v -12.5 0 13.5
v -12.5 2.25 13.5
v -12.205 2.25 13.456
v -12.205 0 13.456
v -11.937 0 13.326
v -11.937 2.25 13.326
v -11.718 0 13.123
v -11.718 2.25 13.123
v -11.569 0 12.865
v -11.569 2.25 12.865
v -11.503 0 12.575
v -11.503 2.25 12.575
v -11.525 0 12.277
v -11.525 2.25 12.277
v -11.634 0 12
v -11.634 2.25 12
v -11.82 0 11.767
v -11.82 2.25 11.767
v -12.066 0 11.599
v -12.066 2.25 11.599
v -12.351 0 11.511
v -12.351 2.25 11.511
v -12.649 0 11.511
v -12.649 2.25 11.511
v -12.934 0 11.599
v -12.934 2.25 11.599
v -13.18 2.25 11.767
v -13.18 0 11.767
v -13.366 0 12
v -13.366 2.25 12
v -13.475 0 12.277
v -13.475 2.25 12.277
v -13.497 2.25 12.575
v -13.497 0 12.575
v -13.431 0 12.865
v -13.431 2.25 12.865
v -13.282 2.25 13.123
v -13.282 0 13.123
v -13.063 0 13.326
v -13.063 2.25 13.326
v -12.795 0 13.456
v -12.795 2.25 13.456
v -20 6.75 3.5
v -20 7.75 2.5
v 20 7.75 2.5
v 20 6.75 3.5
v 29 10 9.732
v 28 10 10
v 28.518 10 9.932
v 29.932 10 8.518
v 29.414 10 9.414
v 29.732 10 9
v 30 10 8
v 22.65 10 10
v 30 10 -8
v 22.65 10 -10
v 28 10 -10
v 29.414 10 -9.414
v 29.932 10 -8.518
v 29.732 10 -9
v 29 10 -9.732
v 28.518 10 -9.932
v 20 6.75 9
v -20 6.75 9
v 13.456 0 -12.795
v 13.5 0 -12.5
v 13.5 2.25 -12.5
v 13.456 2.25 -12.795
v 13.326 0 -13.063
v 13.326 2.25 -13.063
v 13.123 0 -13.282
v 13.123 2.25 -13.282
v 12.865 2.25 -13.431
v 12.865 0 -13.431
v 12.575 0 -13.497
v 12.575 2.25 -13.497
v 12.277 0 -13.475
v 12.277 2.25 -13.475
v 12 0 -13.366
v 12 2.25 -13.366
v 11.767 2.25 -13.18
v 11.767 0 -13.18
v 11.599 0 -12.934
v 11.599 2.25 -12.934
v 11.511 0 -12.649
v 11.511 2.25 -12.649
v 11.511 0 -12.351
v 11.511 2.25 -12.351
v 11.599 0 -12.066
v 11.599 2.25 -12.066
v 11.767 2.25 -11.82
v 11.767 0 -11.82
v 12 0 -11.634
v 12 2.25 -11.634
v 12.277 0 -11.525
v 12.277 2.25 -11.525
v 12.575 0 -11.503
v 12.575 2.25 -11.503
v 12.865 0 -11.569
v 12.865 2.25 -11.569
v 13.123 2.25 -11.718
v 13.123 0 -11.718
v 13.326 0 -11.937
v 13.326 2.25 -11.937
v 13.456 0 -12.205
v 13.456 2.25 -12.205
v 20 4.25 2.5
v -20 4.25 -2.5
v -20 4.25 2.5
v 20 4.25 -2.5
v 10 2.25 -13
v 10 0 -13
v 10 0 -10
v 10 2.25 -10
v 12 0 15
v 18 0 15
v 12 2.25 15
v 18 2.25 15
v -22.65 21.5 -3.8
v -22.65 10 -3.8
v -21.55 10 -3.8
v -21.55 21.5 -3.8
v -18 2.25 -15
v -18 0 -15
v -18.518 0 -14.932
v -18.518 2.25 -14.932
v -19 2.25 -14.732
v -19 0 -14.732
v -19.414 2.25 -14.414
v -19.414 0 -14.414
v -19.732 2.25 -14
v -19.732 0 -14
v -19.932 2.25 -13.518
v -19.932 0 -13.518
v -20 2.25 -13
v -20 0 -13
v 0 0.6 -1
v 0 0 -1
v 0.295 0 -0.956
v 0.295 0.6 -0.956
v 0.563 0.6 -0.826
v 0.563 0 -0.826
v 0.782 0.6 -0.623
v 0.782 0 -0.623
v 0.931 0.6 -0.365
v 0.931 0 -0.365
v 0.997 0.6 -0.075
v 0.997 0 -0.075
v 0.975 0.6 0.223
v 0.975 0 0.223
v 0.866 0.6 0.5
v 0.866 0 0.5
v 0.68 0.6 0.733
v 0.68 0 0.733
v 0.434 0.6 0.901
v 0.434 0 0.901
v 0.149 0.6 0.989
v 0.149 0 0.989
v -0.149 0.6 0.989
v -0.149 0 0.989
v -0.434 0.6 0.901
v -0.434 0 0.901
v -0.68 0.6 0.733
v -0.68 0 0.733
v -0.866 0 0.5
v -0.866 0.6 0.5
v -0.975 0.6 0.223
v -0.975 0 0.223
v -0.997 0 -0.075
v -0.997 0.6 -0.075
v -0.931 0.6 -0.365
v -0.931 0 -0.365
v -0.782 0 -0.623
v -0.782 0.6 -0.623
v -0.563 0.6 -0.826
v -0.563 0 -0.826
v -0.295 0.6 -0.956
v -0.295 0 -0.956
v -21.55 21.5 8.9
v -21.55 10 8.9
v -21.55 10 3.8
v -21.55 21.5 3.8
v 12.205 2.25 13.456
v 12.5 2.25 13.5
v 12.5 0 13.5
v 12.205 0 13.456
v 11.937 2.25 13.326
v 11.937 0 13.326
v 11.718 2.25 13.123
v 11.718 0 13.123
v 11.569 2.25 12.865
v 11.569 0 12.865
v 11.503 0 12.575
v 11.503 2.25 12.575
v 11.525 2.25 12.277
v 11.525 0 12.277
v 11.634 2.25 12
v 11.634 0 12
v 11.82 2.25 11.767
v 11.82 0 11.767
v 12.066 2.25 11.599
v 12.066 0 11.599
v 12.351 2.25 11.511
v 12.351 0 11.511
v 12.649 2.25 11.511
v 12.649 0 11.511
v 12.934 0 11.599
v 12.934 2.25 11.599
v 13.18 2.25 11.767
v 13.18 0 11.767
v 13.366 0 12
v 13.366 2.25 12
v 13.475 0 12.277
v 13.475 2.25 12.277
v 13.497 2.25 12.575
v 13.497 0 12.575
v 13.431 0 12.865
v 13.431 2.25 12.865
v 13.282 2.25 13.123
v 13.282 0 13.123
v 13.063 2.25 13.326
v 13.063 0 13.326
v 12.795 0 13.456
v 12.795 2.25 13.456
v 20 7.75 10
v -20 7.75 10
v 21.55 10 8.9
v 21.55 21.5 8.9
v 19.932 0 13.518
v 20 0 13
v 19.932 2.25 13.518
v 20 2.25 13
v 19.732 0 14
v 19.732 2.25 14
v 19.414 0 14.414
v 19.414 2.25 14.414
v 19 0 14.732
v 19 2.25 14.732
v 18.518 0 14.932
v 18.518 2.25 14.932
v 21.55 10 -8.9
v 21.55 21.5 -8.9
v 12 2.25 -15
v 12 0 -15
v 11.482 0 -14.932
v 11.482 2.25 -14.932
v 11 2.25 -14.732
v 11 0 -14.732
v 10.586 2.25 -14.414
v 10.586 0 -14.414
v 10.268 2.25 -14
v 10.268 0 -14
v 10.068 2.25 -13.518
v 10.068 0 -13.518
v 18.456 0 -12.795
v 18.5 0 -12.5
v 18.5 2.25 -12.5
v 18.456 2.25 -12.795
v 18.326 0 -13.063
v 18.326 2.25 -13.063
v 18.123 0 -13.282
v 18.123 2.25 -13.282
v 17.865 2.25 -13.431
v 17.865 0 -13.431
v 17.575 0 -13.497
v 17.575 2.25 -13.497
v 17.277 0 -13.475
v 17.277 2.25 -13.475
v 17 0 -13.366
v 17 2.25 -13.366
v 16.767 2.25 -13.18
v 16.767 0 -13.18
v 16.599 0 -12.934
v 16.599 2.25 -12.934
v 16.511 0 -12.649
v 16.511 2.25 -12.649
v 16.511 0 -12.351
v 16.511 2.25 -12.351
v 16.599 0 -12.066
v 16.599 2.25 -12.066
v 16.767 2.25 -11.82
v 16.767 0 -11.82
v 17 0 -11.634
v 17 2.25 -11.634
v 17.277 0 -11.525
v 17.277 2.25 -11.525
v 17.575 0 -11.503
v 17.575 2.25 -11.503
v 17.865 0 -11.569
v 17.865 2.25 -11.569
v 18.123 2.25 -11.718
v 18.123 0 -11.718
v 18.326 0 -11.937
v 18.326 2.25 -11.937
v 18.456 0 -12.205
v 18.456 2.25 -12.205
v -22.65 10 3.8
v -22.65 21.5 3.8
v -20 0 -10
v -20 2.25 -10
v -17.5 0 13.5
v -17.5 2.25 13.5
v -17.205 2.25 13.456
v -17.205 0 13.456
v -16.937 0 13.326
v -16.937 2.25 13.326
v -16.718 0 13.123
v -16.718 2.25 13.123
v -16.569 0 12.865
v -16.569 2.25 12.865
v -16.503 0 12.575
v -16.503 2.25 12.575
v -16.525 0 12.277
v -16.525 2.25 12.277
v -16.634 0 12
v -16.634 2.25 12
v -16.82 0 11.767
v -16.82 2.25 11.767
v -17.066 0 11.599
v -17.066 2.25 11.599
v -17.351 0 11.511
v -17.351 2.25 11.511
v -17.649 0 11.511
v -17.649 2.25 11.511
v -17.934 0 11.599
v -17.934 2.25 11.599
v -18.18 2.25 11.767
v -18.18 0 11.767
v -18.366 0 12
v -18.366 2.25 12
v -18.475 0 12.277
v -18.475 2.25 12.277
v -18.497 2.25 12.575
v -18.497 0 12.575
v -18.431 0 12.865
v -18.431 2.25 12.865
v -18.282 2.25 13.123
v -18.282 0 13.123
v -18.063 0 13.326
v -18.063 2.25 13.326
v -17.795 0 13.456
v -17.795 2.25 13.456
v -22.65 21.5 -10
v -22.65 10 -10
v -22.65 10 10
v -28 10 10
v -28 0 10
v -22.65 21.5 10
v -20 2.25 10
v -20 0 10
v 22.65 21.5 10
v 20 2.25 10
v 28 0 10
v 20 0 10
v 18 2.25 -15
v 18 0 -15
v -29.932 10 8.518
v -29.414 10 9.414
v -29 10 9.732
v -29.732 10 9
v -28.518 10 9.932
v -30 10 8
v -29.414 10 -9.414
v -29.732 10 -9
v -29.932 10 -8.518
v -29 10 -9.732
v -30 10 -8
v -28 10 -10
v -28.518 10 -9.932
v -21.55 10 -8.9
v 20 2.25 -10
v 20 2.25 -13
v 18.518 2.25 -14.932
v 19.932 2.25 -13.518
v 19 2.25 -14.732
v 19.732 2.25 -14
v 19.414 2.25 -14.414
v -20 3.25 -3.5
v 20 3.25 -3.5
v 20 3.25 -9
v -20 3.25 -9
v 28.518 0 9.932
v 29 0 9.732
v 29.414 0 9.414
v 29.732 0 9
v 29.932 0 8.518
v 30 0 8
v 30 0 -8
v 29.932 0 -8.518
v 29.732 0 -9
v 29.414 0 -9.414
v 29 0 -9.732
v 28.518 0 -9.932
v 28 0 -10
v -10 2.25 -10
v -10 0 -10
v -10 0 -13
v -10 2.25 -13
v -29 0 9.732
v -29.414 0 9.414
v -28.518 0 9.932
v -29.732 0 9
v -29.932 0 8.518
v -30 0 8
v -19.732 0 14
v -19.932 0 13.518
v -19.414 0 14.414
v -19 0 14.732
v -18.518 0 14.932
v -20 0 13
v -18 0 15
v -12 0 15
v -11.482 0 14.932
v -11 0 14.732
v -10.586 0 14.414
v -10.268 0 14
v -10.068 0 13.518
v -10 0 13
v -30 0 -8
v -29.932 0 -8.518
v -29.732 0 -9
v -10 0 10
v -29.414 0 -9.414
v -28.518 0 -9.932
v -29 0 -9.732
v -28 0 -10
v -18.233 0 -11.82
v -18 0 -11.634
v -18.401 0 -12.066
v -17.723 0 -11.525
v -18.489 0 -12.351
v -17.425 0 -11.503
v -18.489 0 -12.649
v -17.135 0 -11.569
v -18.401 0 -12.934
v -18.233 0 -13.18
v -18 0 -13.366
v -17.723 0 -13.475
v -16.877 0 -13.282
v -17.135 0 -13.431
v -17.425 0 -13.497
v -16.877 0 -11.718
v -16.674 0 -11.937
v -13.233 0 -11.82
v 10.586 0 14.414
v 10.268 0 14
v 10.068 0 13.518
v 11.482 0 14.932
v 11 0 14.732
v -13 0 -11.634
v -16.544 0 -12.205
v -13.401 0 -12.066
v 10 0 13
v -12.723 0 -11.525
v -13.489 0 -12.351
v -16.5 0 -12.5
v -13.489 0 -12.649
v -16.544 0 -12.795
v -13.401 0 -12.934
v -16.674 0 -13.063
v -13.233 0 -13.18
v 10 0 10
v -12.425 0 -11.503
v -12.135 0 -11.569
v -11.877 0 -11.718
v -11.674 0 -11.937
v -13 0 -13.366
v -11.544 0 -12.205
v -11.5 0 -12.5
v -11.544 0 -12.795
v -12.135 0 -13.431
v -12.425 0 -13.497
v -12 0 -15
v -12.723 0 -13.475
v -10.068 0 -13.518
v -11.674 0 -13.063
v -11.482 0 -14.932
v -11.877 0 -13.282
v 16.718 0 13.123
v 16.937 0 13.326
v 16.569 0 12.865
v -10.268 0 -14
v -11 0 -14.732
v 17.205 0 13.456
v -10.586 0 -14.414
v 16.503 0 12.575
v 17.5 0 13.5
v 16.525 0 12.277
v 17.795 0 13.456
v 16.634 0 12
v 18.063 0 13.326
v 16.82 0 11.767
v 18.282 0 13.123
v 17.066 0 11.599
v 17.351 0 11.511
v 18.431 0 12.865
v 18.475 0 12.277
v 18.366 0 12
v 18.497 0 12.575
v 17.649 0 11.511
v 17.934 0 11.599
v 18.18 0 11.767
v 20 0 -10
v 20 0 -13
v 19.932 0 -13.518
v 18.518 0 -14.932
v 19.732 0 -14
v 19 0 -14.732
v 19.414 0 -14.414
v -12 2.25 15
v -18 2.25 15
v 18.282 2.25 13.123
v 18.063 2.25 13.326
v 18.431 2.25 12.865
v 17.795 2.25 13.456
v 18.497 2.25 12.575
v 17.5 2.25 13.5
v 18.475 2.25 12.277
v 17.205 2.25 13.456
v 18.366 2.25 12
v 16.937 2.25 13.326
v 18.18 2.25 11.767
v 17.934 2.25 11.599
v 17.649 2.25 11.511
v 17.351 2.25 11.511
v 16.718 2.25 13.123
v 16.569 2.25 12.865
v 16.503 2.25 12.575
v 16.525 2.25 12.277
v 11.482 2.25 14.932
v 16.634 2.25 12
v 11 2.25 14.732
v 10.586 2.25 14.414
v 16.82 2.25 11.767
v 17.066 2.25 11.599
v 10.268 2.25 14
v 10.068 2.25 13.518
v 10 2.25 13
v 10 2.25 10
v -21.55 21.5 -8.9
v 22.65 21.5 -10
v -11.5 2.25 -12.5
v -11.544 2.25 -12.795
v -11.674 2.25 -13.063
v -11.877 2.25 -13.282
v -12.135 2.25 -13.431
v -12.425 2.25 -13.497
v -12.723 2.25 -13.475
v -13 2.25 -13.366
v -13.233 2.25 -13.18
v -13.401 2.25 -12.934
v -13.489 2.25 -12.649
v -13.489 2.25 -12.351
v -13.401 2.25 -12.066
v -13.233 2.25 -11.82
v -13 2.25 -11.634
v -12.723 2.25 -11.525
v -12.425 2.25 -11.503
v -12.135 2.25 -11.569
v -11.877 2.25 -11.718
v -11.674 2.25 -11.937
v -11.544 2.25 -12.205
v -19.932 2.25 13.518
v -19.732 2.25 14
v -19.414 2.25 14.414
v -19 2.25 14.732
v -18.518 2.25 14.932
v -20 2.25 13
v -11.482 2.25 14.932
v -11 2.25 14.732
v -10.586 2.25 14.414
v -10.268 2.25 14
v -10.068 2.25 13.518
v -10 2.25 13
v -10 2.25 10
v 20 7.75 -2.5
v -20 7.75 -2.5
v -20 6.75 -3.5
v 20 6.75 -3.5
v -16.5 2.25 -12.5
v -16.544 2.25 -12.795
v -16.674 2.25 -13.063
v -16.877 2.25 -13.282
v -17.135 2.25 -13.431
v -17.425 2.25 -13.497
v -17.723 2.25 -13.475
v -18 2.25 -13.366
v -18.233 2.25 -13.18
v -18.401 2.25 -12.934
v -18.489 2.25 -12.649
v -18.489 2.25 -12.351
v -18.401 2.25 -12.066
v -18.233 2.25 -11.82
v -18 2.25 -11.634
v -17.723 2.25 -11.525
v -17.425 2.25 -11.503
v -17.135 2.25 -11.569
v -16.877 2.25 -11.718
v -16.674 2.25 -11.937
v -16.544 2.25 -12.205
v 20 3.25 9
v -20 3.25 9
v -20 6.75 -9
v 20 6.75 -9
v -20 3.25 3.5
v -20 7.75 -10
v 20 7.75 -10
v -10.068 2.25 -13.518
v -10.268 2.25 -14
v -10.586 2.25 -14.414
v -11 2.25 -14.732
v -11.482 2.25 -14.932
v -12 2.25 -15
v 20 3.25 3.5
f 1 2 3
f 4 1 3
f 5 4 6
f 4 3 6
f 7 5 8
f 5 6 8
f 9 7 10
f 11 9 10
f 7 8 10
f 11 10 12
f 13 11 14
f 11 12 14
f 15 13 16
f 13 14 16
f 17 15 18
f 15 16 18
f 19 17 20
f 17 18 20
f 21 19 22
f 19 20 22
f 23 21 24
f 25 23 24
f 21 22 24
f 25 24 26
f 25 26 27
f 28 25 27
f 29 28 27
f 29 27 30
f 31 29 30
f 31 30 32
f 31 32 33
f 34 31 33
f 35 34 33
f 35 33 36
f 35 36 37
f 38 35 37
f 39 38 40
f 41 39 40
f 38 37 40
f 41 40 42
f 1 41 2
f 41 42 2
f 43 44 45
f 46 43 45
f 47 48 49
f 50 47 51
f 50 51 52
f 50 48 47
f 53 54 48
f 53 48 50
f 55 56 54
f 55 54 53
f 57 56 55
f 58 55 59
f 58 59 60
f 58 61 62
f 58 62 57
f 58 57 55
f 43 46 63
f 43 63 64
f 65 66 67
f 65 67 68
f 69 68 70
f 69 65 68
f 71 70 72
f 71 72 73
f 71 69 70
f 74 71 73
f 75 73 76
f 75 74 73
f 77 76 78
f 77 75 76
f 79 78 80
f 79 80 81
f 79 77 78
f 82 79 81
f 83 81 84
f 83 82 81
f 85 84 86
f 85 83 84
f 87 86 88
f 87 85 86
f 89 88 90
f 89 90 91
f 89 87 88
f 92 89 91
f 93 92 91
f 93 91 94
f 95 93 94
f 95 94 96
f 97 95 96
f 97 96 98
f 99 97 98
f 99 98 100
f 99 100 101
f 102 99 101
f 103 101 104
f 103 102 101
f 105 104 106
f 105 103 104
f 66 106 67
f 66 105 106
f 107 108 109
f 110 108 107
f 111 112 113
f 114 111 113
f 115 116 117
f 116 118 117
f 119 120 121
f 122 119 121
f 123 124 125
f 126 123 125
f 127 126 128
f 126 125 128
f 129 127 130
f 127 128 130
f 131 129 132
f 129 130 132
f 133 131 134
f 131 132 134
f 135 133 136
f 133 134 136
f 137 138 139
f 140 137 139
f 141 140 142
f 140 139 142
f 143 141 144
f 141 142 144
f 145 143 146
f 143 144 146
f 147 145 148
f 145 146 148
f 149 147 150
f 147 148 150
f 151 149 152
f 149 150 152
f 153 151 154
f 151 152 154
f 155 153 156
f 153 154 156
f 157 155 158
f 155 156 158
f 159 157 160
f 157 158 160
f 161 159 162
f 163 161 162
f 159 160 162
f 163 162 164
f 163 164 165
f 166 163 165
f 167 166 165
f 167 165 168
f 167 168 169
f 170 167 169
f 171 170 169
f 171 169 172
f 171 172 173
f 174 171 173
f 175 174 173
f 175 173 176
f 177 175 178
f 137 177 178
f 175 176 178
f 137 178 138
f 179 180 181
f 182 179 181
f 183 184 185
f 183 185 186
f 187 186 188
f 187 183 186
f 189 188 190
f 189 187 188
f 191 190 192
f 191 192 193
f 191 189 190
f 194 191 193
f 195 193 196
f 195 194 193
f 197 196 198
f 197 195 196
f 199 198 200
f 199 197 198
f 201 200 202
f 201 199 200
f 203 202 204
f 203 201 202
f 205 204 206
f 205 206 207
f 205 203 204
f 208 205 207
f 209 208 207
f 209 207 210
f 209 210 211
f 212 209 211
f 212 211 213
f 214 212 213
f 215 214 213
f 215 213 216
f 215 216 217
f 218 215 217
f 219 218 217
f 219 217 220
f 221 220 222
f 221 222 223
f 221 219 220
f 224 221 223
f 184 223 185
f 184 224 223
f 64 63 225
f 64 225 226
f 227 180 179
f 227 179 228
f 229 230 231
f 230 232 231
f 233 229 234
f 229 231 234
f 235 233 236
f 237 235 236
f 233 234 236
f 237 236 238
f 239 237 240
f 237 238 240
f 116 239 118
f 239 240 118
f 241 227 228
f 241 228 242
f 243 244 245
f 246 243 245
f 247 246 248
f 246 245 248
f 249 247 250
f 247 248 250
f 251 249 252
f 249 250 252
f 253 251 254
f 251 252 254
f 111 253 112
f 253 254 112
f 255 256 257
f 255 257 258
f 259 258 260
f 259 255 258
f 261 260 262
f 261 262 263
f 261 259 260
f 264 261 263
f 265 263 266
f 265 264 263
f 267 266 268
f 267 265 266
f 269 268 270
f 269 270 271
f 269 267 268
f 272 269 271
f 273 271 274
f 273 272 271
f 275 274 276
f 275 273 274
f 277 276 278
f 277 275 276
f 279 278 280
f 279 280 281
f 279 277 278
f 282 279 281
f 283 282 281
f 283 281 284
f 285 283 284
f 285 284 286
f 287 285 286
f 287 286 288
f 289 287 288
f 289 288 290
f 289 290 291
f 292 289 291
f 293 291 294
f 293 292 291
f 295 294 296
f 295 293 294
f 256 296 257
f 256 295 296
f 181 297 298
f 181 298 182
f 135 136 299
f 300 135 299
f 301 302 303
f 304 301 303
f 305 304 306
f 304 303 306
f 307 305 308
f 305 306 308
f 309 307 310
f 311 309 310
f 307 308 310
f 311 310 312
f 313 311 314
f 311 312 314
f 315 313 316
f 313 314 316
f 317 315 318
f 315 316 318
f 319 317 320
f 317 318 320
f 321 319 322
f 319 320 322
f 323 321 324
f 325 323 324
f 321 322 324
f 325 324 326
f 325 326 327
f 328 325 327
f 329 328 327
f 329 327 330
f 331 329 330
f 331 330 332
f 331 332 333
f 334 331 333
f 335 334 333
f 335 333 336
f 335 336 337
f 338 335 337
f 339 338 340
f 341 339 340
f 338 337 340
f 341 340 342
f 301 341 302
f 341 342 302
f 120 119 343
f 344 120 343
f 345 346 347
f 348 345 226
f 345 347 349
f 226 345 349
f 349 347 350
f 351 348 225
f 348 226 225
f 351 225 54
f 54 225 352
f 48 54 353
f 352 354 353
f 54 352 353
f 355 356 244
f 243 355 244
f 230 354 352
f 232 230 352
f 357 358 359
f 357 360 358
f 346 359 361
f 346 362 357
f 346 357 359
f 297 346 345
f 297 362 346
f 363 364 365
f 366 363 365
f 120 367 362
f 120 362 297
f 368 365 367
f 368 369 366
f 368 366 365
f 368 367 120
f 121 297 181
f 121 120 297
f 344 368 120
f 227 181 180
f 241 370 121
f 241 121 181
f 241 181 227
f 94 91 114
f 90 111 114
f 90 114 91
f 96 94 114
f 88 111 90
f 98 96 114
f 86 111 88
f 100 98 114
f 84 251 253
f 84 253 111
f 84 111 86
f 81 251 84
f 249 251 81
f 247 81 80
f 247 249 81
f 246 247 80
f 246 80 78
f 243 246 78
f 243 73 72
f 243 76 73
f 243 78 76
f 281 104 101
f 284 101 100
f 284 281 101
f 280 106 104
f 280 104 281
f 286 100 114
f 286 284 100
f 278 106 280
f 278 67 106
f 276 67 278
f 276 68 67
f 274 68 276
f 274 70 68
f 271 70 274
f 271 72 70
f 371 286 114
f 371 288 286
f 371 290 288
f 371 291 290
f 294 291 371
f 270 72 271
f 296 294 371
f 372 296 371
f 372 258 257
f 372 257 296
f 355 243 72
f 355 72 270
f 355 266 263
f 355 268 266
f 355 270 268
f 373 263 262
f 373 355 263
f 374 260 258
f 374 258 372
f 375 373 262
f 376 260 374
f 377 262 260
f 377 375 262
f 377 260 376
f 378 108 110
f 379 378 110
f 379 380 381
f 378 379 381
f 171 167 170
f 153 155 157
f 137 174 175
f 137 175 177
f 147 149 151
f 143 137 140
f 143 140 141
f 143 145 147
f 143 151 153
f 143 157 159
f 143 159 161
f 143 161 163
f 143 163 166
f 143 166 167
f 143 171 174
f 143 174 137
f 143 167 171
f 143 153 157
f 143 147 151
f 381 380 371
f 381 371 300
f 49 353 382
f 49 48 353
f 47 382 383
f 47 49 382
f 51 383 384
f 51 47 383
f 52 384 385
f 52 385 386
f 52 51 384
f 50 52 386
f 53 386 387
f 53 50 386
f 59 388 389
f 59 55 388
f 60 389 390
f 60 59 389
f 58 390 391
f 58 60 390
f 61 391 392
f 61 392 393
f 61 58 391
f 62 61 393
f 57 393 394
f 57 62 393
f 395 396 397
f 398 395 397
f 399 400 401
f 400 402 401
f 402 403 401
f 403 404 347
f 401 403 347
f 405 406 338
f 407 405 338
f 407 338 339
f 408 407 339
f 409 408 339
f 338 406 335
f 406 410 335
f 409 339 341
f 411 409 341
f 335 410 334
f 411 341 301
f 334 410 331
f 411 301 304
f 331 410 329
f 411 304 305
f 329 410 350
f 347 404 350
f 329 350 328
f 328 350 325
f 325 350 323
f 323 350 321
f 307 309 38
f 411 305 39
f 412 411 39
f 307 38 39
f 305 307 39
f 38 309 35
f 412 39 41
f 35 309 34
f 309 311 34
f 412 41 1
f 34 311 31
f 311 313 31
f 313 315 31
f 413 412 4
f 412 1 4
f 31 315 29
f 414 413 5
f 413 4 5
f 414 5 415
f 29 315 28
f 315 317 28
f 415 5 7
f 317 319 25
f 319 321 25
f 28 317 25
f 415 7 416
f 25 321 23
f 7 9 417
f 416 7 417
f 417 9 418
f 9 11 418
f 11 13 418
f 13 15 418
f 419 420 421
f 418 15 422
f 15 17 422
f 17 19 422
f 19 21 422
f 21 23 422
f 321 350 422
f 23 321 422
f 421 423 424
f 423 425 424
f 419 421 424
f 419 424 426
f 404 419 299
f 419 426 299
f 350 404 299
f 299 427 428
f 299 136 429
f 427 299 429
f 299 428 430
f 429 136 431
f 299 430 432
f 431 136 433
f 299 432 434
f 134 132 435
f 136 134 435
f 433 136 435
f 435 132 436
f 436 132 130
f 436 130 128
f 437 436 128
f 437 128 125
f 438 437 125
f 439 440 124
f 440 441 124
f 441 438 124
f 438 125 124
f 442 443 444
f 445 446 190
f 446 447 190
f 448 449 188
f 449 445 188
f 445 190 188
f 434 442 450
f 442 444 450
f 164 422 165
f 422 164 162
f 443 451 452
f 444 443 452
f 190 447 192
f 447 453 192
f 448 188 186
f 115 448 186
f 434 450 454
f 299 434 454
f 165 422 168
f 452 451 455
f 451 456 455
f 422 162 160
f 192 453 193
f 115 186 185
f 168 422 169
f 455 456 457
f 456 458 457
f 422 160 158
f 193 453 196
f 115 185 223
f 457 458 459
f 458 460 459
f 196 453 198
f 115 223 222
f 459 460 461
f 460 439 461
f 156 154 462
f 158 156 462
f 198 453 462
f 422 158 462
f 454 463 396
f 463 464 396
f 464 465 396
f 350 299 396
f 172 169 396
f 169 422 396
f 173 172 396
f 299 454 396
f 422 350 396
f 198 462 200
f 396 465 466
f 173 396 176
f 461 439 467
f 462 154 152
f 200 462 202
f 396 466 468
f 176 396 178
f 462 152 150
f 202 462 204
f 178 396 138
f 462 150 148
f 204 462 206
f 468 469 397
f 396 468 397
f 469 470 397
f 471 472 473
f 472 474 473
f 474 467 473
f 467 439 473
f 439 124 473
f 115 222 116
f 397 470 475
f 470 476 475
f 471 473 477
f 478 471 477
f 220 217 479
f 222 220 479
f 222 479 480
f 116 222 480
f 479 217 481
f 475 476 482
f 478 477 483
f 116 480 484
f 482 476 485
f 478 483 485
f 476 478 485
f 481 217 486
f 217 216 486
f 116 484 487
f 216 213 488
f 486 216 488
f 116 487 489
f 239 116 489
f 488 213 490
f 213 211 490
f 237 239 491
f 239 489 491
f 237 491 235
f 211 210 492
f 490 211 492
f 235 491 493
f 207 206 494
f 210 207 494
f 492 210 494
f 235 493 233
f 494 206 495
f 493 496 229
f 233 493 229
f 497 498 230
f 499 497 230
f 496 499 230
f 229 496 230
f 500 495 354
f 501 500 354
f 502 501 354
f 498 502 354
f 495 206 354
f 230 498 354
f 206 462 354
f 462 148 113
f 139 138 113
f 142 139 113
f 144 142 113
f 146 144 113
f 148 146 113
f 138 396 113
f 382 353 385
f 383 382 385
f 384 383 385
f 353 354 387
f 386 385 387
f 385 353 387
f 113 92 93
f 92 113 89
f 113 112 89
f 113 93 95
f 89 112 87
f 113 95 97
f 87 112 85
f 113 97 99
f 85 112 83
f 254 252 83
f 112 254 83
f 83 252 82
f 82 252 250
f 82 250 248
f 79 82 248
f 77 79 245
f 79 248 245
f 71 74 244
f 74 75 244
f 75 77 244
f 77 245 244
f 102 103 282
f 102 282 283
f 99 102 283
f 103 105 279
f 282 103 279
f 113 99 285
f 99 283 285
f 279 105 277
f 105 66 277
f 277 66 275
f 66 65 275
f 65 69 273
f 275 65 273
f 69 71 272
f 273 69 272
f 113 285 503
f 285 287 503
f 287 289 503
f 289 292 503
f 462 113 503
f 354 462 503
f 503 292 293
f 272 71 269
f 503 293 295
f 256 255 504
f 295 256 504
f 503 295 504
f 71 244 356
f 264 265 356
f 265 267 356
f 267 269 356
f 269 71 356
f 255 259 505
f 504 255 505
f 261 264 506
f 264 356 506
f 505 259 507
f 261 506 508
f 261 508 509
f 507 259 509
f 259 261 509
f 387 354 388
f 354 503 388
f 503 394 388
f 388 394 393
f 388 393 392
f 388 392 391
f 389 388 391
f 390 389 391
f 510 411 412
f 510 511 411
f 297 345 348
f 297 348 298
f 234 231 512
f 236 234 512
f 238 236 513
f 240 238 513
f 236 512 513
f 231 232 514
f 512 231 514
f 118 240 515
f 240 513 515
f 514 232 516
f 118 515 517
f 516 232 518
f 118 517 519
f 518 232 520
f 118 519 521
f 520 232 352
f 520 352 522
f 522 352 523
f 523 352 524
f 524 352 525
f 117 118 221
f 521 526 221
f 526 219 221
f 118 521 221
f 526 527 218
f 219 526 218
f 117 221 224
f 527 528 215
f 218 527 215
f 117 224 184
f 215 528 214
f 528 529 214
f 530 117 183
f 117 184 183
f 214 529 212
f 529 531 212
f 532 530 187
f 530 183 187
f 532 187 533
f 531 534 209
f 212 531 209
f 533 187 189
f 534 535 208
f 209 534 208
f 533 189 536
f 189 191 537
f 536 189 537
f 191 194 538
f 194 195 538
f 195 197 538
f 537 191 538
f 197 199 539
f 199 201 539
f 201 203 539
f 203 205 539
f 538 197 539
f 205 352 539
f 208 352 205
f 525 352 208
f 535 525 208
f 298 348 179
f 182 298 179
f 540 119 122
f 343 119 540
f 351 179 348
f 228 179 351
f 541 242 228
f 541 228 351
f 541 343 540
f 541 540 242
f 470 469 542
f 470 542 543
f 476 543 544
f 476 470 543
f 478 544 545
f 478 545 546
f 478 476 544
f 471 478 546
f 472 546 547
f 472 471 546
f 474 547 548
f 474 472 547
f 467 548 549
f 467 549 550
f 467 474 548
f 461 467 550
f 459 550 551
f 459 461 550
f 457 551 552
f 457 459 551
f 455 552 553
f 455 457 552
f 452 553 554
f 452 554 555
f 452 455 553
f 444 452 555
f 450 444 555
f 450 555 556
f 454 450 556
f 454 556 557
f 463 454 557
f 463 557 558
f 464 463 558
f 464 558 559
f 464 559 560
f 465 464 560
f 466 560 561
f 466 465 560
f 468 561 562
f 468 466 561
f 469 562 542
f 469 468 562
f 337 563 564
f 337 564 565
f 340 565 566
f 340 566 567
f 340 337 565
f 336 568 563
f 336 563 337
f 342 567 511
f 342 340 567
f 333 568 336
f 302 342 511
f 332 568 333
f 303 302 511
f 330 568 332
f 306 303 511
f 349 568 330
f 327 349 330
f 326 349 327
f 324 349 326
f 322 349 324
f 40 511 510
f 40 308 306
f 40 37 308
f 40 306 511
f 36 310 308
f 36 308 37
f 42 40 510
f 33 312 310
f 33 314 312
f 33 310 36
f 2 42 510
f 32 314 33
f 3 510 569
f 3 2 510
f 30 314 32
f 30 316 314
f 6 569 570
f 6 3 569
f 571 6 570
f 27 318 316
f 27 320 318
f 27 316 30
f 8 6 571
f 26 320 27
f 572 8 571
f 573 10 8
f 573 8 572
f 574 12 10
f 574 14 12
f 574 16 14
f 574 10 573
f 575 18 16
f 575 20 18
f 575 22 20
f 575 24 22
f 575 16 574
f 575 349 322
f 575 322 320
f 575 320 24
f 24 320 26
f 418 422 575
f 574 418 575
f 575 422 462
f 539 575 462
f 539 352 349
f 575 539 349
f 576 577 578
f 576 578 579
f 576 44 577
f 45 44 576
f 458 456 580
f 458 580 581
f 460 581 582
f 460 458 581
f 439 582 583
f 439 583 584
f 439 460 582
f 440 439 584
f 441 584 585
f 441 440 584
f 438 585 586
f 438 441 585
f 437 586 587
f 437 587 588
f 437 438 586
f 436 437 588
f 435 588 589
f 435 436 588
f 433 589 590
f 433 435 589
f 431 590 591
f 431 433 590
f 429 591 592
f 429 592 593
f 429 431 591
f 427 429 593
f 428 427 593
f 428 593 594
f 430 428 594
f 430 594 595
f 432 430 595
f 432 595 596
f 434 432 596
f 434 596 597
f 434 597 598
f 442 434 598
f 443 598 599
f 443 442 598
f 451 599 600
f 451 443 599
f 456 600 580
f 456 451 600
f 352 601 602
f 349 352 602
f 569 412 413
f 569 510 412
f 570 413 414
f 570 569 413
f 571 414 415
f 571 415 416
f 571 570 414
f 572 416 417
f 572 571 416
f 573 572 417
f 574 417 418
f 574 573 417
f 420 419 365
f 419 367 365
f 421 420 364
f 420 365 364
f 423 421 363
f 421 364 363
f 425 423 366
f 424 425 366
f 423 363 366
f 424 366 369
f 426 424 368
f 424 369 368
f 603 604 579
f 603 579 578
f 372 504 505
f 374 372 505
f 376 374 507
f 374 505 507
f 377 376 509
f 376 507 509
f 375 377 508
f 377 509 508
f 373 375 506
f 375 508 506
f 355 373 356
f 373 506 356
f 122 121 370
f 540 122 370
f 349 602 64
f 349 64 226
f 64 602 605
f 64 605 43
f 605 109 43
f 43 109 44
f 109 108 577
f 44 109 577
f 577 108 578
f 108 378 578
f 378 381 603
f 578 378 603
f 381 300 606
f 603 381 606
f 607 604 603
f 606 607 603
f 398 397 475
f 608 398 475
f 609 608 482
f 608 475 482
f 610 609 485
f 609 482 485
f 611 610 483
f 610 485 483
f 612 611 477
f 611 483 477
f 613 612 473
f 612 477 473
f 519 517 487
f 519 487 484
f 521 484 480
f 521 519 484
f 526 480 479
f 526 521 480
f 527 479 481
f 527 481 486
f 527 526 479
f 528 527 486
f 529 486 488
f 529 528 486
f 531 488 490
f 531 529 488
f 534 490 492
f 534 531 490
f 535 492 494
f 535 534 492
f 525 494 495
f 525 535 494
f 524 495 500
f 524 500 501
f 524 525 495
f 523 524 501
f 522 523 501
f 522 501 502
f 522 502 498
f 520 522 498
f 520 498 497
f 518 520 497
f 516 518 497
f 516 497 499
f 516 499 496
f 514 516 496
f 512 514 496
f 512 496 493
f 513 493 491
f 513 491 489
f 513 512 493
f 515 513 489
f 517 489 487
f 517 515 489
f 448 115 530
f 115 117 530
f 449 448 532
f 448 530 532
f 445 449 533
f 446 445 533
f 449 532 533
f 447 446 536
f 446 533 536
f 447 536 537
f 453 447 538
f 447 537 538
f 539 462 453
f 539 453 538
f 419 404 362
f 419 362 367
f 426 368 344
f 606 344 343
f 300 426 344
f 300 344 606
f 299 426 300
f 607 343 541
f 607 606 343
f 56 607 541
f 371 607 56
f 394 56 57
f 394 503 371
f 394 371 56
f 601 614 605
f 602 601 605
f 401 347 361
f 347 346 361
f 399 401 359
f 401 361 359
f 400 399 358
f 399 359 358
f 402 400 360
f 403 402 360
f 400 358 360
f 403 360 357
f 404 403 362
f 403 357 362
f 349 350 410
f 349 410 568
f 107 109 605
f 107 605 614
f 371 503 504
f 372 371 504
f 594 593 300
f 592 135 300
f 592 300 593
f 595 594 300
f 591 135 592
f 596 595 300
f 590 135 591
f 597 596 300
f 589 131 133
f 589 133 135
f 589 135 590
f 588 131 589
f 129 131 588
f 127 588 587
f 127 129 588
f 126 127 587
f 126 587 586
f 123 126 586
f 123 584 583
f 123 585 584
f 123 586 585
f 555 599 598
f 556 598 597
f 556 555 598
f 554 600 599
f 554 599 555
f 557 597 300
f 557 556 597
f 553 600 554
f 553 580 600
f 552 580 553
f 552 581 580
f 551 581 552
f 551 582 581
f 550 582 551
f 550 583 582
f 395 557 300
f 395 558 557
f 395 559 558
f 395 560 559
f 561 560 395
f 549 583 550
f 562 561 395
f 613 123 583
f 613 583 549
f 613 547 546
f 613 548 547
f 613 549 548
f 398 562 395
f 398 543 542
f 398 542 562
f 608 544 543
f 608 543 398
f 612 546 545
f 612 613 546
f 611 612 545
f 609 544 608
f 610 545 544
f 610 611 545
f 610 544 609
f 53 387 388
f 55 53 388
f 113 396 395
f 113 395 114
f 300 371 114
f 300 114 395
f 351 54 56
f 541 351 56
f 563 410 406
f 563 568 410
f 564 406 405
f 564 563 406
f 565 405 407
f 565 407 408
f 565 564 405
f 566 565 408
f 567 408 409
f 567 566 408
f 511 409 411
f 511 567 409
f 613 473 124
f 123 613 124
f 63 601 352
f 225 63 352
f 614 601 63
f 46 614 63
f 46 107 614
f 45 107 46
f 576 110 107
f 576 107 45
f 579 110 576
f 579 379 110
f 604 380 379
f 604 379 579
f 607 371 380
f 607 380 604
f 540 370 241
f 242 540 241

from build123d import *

# Parameters (mm, degrees)
SKETCH1_W            = 60
SKETCH1_H            = 20
BASE_DEPTH           = 10
SKETCH5_W            = 40
SKETCH5_H            = 3.5
CUT_EXTRUDE3_DEPTH   = 20
SKETCH6_W            = 40
SKETCH6_H            = 5
BOSS_EXTRUDE4_DEPTH  = 1
SKETCH8_W            = 40
SKETCH8_H            = 5
CUT_EXTRUDE6_DEPTH   = 1
CHAMFER2_SIZE        = 1
SKETCH13_W           = 45.3
SKETCH13_H           = 20
SKETCH13_W_2         = 43.1
SKETCH13_H_2         = 17.8
BOSS_EXTRUDE5_DEPTH  = 11.5
SKETCH14_W           = 3.171036328
SKETCH14_H           = 7.6
CUT_EXTRUDE11_DEPTH  = 11.5
FILLET2_R            = 2
SKETCH17_W           = 10
SKETCH17_H           = 2.25
BOSS_EXTRUDE7_DEPTH  = 5
SKETCH18_R           = 1
CUT_EXTRUDE12_DEPTH  = 2.25
FILLET3_R            = 2
FILLET3_OF_MIRROR6_R = 2
MIRROR7_OUTLINE_R    = 1
MIRROR7_DEPTH        = 2.25
SKETCH19_R           = 1
CUT_EXTRUDE13_DEPTH  = 0.6


# Read off the part's stored shape, not the designer's step: Mirror7
with BuildPart() as part:
    # Sketch1 → Base (new body)
    with BuildSketch(Plane(origin=(0, 0, 0), x_dir=(1, 0, 0), z_dir=(0, 1, 0))):
        Rectangle(SKETCH1_W, SKETCH1_H)
    extrude(amount=BASE_DEPTH)

    # Sketch5 → Cut-Extrude3 (cut)
    with BuildSketch(Plane(origin=(0, 0, -10), x_dir=(-1, 0, 0), z_dir=(0, 0, -1))):
        with Locations((0, 5)):
            Rectangle(SKETCH5_W, SKETCH5_H)
    extrude(amount=-CUT_EXTRUDE3_DEPTH, mode=Mode.SUBTRACT)

    # Sketch6 → Boss-Extrude4 (add)
    with BuildSketch(Plane(origin=(0, 3.25, 0), x_dir=(1, 0, 0), z_dir=(0, 1, 0))):
        Rectangle(SKETCH6_W, SKETCH6_H)
    extrude(amount=BOSS_EXTRUDE4_DEPTH)

    # Sketch8 → Cut-Extrude6 (cut)
    with BuildSketch(Plane.XZ.offset(-6.75)):
        Rectangle(SKETCH8_W, SKETCH8_H)
    extrude(amount=-CUT_EXTRUDE6_DEPTH, mode=Mode.SUBTRACT)

    # Chamfer2
    chamfer2_edges = [part.edges().sort_by_distance(p)[0] for p in [
        (0, 6.75, -2.5),
        (0, 6.75, 10),
        (0, 3.25, -2.5),
        (0, 3.25, 2.5),
        (0, 3.25, -10),
        (0, 6.75, -10),
        (0, 3.25, 10),
        (0, 6.75, 2.5),
    ]]
    chamfer(chamfer2_edges, length=CHAMFER2_SIZE - 0.0001)  # a hair under: the kernel refuses the full size

    # Sketch13 → Boss-Extrude5 (add)
    with BuildSketch(Plane(origin=(0, 10, 0), x_dir=(1, 0, 0), z_dir=(0, 1, 0))):
        Rectangle(SKETCH13_W, SKETCH13_H)
        Rectangle(SKETCH13_W_2, SKETCH13_H_2, mode=Mode.SUBTRACT)
    extrude(amount=BOSS_EXTRUDE5_DEPTH)

    # Sketch14 → Cut-Extrude11 (cut)
    with BuildSketch(Plane(origin=(0, 21.5, 0), x_dir=(1, 0, 0), z_dir=(0, 1, 0))):
        with Locations((-21.55, 0)):
            Rectangle(SKETCH14_W, SKETCH14_H)
    extrude(amount=-CUT_EXTRUDE11_DEPTH, mode=Mode.SUBTRACT)

    # Fillet2
    fillet2_edges = [part.edges().sort_by_distance(p)[0] for p in [
        (30, 5, 10),
        (-30, 5, 10),
        (-30, 5, -10),
        (30, 5, -10),
    ]]
    fillet(fillet2_edges, radius=FILLET2_R)

    # Sketch17 → Boss-Extrude7 (add)
    with BuildSketch(Plane.XY.offset(10)):
        with Locations((-15, 1.125)):
            Rectangle(SKETCH17_W, SKETCH17_H)
    boss_extrude7 = extrude(amount=BOSS_EXTRUDE7_DEPTH)

    # Sketch18 → Cut-Extrude12 (cut)
    with BuildSketch(Plane(origin=(0, 2.25, 0), x_dir=(1, 0, 0), z_dir=(0, 1, 0))):
        with Locations(Location((-17.5, -12.5, 0), (0, 0, 270))):
            Circle(SKETCH18_R)
        with Locations(Location((-12.5, -12.5, 0), (0, 0, 270))):
            Circle(SKETCH18_R)
    cut_extrude12 = extrude(amount=-CUT_EXTRUDE12_DEPTH, mode=Mode.SUBTRACT)

    # Fillet3
    fillet3_edges = [part.edges().sort_by_distance(p)[0] for p in [
        (-20, 1.125, 15),
        (-10, 1.125, 15),
    ]]
    fillet(fillet3_edges, radius=FILLET3_R)

    # Mirror6: Boss-Extrude7, Cut-Extrude12 across plane
    add(boss_extrude7.mirror(Plane(origin=(0, 0, 0), x_dir=(0, 0, 1), z_dir=(1, 0, 0))))
    add(cut_extrude12.mirror(Plane(origin=(0, 0, 0), x_dir=(0, 0, 1), z_dir=(1, 0, 0))), mode=Mode.SUBTRACT)

    # Fillet3 of Mirror6
    fillet3_of_mirror6_edges = [part.edges().sort_by_distance(p)[0] for p in [
        (20, 1.125, 15),
        (10, 1.125, 15),
    ]]
    fillet(fillet3_of_mirror6_edges, radius=FILLET3_OF_MIRROR6_R)

    # Mirror7 outline → Mirror7 (add)
    # profile 1 of 2: a face of its own
    with BuildSketch(Plane(origin=(0, 0, 0), x_dir=(1, 0, 0), z_dir=(0, 1, 0))):
        with BuildLine():
            ThreePointArc((-18, 15), (-19.414213562, 14.414213562), (-20, 13))
            Line((-20, 13), (-20, 10))
            Line((-20, 10), (-10, 10))
            Line((-10, 10), (-10, 13))
            ThreePointArc((-10, 13), (-10.585786438, 14.414213562), (-12, 15))
            Line((-12, 15), (-18, 15))
        make_face()
        with Locations((-17.5, 12.5)):
            Circle(MIRROR7_OUTLINE_R, mode=Mode.SUBTRACT)
        with Locations((-12.5, 12.5)):
            Circle(MIRROR7_OUTLINE_R, mode=Mode.SUBTRACT)
    # profile 2 of 2: a face of its own
    with BuildSketch(Plane(origin=(0, 0, 0), x_dir=(1, 0, 0), z_dir=(0, 1, 0))):
        with BuildLine():
            Line((10, 13), (10, 10))
            Line((10, 10), (20, 10))
            Line((20, 10), (20, 13))
            ThreePointArc((20, 13), (19.414213562, 14.414213562), (18, 15))
            Line((18, 15), (12, 15))
            ThreePointArc((12, 15), (10.585786438, 14.414213562), (10, 13))
        make_face()
        with Locations((12.5, 12.5)):
            Circle(MIRROR7_OUTLINE_R, mode=Mode.SUBTRACT)
        with Locations((17.5, 12.5)):
            Circle(MIRROR7_OUTLINE_R, mode=Mode.SUBTRACT)
    extrude(amount=MIRROR7_DEPTH)

    # Sketch19 → Cut-Extrude13 (cut)
    with BuildSketch(Plane.XZ):
        with Locations(Location((0, 0, 0), (0, 0, 270))):
            Circle(SKETCH19_R)
    extrude(amount=-CUT_EXTRUDE13_DEPTH, mode=Mode.SUBTRACT)


solid = part.part
